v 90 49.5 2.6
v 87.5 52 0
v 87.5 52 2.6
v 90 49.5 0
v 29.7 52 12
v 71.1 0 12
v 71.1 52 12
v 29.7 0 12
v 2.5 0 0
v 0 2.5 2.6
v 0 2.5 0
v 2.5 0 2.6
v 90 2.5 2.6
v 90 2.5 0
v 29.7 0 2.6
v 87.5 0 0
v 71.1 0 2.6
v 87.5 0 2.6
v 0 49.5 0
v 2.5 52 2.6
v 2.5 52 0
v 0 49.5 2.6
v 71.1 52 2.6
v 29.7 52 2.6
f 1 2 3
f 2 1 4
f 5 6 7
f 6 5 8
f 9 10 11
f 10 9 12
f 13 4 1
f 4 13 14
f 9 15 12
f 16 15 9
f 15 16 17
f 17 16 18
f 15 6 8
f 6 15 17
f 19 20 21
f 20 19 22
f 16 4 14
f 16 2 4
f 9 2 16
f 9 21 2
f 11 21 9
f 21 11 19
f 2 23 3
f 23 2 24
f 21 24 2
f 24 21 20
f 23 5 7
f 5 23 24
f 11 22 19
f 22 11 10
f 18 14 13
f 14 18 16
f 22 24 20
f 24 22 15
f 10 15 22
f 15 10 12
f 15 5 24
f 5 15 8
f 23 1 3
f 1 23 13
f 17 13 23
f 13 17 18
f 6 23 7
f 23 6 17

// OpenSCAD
$fn = 32;

// ----------------------------------------------------------------------
// Stepped bar: centerstep, 90 x 52 x 12/2.6 mm
// ----------------------------------------------------------------------

// --- parameters (mm) ---
bar_l = 90;               // bar length, X
bar_w = 52;               // bar width, Y
plate_t = 12;             // thickness of the thick zone, Z
thin_t = 2.6;             // thickness of the thin zone
corner_c = 2.5;           // corner chamfer of the bar
step_cut = 9.4;           // material removed from the thin zone
thick_from = 29.7;        // start of the thick middle zone
thick_to = 71.1;          // end of the thick middle zone
depth_1 = 9.4;            // depth of cut 1 from the top face
depth_2 = 9.4;            // depth of cut 2 from the top face

profile = [[2.5, 0], [87.5, 0], [90, 2.5], [90, 49.5], [87.5, 52], [2.5, 52], [0, 49.5], [0, 2.5]];  // primary outline, 8 points, counter clockwise
void_1 = [[-1, -1], [29.7, -1], [29.7, 53], [-1, 53]];  // thin left end, 4 points
void_2 = [[71.1, -1], [91, -1], [91, 53], [71.1, 53]];  // thin right end, 4 points

// --- the one profile operation ---
difference() {
  linear_extrude(height = plate_t) polygon(points = profile);
  translate([0, 0, plate_t - depth_1])
    linear_extrude(height = depth_1 + 1) polygon(points = void_1);
  translate([0, 0, plate_t - depth_2])
    linear_extrude(height = depth_2 + 1) polygon(points = void_2);
}
